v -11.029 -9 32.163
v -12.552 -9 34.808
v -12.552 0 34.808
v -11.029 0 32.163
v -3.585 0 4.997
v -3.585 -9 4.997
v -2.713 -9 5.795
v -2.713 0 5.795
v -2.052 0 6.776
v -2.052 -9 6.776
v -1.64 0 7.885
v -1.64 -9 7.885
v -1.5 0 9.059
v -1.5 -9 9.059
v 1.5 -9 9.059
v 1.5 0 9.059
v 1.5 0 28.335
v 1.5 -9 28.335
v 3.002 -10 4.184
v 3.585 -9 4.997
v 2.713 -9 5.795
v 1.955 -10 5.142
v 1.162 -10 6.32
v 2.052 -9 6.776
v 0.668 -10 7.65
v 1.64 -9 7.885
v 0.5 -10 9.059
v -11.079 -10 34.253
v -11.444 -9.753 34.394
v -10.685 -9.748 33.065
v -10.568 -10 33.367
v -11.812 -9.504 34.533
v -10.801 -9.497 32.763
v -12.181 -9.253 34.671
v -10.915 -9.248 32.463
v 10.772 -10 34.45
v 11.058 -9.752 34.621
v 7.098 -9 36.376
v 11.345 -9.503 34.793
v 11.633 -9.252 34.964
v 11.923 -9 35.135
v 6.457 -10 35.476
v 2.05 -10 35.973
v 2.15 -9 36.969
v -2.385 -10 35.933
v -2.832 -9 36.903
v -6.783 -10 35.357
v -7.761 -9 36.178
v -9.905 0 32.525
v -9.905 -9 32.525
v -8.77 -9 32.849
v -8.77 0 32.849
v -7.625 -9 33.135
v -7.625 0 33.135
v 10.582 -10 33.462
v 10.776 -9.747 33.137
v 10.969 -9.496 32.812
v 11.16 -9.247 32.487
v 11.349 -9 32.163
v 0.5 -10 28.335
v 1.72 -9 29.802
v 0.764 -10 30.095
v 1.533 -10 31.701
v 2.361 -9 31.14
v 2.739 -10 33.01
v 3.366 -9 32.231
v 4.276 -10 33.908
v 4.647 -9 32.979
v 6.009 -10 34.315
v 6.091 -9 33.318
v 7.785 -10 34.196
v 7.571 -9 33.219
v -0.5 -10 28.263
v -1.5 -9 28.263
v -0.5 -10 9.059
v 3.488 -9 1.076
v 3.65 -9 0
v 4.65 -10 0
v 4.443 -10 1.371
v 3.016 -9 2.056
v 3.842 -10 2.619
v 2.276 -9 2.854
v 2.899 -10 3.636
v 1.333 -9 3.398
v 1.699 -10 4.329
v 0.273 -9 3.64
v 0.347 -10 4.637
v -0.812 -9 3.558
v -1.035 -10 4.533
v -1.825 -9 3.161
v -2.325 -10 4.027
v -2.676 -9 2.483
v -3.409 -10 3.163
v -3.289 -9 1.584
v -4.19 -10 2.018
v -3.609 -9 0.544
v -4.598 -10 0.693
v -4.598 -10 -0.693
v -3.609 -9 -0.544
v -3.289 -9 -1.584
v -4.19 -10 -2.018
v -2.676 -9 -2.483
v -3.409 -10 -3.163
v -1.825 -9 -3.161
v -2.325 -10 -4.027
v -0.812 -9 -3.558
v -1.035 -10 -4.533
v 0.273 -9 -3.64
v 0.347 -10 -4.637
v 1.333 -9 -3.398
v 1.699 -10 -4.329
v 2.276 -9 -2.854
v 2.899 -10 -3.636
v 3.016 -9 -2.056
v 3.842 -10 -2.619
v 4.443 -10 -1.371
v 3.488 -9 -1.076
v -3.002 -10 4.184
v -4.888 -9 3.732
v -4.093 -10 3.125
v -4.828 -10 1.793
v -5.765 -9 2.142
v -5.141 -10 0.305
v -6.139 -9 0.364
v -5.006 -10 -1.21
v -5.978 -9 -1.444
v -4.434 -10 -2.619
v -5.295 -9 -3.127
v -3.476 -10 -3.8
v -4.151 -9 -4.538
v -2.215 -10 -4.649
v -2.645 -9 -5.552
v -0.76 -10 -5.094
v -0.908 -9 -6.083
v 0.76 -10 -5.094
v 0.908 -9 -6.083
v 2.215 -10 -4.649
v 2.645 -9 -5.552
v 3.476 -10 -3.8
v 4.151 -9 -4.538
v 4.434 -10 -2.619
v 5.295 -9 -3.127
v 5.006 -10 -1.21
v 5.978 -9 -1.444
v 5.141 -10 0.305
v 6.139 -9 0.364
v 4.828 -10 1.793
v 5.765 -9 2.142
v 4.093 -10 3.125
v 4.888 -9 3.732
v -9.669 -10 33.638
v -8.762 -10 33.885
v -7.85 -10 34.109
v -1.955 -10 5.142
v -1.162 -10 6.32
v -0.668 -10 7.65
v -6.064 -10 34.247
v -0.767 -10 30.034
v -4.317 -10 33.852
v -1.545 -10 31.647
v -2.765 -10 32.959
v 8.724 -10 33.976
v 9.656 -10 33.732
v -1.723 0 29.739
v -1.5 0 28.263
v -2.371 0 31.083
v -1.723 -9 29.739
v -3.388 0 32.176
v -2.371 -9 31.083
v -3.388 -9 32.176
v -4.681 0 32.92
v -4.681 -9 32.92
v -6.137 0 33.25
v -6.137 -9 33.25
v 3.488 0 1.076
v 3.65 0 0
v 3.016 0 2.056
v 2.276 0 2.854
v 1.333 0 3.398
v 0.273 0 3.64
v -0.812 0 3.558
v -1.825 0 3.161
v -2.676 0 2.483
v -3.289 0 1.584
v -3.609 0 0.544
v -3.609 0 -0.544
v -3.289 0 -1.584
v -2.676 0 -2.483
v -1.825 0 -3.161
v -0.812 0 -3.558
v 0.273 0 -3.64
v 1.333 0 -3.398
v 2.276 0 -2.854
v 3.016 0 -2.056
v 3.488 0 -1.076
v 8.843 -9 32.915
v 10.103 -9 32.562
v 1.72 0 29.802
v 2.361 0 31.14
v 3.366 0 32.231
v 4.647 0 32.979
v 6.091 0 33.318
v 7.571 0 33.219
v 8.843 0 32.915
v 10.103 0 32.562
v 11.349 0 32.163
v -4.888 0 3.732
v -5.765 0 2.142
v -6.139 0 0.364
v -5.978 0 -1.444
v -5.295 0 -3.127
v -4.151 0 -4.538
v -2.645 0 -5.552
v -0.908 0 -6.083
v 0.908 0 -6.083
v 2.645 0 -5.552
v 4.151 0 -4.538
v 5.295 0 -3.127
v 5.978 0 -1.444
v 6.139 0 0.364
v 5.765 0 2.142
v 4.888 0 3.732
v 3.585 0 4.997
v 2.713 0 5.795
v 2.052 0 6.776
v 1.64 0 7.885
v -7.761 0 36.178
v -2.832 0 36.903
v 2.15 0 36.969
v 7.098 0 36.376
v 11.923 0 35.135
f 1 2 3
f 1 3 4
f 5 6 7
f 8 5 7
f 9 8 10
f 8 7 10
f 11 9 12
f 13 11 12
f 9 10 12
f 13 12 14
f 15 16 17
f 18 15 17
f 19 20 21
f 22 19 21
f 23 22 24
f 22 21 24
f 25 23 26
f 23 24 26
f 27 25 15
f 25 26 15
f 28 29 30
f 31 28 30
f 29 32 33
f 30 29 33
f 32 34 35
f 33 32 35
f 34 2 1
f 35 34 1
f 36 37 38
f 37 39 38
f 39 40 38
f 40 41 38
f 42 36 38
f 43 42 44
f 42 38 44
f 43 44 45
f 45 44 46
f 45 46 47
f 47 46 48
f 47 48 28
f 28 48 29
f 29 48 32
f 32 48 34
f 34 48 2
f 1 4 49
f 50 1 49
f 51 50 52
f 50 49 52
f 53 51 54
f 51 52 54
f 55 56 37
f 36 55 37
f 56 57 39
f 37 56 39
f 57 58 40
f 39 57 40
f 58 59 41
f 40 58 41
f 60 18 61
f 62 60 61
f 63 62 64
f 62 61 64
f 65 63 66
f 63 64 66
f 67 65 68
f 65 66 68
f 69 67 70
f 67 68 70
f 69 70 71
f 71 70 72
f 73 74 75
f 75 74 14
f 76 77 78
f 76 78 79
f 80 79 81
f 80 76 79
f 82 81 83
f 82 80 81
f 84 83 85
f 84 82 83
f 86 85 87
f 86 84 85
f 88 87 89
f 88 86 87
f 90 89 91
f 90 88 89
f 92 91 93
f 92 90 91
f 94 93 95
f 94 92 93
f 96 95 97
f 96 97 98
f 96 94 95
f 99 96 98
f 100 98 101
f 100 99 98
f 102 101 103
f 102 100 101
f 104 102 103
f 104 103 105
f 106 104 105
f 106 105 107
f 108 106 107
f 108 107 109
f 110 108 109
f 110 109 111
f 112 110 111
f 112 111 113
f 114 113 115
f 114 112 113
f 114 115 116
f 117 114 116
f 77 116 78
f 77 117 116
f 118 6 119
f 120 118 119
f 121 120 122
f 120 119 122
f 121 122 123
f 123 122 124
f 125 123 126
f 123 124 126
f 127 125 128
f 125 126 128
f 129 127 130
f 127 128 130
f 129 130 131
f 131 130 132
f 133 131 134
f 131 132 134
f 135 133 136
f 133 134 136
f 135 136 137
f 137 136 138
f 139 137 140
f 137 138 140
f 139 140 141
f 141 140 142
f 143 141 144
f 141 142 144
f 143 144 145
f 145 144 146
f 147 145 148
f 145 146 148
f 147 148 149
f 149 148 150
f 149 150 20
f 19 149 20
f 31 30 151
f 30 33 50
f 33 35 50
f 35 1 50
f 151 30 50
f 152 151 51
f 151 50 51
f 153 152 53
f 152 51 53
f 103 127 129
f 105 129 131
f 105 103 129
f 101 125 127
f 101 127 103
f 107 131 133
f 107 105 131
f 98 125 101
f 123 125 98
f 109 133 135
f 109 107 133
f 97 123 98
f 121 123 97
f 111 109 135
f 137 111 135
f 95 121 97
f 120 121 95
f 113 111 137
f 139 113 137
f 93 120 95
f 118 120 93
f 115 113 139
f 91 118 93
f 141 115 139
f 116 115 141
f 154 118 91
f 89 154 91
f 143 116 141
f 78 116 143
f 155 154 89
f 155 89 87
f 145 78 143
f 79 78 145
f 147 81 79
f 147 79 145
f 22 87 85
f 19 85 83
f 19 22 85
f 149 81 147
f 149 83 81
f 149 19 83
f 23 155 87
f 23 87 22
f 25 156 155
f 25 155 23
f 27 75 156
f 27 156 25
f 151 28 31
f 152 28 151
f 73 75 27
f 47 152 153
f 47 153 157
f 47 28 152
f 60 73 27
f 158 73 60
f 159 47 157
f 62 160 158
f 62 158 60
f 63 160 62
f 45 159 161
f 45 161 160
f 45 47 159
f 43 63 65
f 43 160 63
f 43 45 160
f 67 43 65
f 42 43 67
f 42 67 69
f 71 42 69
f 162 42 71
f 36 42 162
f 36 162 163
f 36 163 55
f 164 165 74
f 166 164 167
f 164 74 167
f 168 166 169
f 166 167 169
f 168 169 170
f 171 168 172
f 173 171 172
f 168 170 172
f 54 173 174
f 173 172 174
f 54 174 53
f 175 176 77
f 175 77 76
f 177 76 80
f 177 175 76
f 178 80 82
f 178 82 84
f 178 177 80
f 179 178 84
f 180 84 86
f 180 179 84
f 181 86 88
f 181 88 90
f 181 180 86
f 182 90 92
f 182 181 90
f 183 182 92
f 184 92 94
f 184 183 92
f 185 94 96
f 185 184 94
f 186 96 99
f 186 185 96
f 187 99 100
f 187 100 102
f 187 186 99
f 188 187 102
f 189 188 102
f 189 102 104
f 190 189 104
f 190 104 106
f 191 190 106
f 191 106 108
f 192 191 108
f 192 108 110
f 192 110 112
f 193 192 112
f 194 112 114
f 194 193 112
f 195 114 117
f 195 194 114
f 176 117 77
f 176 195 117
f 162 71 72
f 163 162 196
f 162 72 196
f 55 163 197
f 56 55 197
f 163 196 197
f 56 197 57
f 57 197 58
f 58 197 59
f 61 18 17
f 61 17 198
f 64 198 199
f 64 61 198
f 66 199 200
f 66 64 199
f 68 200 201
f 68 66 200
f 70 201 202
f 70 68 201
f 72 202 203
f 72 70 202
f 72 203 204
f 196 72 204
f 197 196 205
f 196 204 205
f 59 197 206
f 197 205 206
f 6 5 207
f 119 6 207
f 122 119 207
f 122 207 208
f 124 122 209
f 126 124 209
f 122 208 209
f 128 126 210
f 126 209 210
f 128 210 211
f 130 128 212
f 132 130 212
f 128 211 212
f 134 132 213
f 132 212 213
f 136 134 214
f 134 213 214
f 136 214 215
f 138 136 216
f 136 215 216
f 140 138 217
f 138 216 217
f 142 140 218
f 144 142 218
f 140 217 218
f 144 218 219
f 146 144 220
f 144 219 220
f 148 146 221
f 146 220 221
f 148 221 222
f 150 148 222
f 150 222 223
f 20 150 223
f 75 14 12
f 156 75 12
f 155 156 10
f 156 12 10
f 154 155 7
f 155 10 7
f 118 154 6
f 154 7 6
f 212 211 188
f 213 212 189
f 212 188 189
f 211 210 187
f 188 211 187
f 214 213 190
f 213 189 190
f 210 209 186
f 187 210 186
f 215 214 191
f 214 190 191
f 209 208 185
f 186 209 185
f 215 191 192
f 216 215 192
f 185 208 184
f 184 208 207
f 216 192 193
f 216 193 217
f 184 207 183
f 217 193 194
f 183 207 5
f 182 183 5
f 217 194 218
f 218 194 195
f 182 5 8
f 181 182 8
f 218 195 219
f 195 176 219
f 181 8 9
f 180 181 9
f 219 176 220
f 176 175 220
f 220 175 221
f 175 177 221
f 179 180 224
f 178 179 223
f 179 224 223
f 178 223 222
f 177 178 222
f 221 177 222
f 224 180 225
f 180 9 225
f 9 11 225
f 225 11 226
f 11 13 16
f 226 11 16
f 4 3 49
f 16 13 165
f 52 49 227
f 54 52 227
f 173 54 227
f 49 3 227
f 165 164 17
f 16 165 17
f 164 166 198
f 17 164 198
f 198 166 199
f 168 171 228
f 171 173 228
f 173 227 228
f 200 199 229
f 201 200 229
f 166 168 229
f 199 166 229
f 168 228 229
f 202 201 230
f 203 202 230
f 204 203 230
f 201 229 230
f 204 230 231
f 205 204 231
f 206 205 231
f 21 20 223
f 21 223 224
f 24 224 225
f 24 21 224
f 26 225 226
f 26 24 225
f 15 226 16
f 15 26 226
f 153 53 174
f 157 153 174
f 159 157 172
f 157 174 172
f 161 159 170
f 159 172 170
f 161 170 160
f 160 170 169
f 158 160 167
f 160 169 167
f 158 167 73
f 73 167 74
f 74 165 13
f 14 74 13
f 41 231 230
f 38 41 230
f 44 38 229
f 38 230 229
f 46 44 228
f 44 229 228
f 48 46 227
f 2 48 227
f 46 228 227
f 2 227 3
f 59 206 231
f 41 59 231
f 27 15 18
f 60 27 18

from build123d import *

# Parameters (mm, degrees)
F0_R     = 3.65
F1_DEPTH = 10
F2_R     = 5
F3_SIZE  = 1


with BuildPart() as f1:
    # F0 (on Front) → F1 (new body)
    with BuildSketch(Plane.XZ):
        with BuildLine():
            Line((-1.5, 32), (-1.5, 5.964269))
            ThreePointArc((-1.5, 5.964269), (0, -6.15), (1.5, 5.964269))
            Line((1.5, 5.964269), (1.5, 32))
            Line((1.5, 32), (1.5, 33.995855))
            ThreePointArc((1.5, 33.995855), (6.49123, 33.437665), (11.349069, 32.162768))
            Line((11.349069, 32.162768), (11.922919, 35.134547))
            ThreePointArc((11.922919, 35.134547), (-0.341827, 37.018449), (-12.551888, 34.807689))
            Line((-12.551888, 34.807689), (-11.028524, 32.162768))
            ThreePointArc((-11.028524, 32.162768), (-6.328333, 33.407946), (-1.5, 33.981945))
            Line((-1.5, 33.981945), (-1.5, 32))
        make_face()
        Circle(F0_R, mode=Mode.SUBTRACT)
    extrude(amount=F1_DEPTH)

    # F2
    f2_edges = [f1.edges().sort_by_distance(p)[0] for p in [
        (1.5, -5, 33.995855),
        (-1.5, -5, 33.981945),
        (1.5, -5, 5.964269),
        (-1.5, -5, 5.964269),
    ]]
    fillet(f2_edges, radius=F2_R)

    # F3
    f3_edges = [f1.edges().sort_by_distance(p)[0] for p in [
        (-1.5, -10, 18.661073),
        (-2.051742, -10, 6.776187),
        (-3.387544, -10, 32.175892),
        (0, -10, -6.15),
        (-9.33922, -10, 32.692204),
        (2.051742, -10, 6.776187),
        (-11.790206, -10, 33.485228),
        (1.5, -10, 18.697149),
        (-0.341827, -10, 37.018449),
        (3.365873, -10, 32.23071),
        (11.635994, -10, 33.648657),
        (9.474964, -10, 32.744415),
        (-3.65, -10, 0),
    ]]
    chamfer(f3_edges, length=F3_SIZE)


solid = f1.part
